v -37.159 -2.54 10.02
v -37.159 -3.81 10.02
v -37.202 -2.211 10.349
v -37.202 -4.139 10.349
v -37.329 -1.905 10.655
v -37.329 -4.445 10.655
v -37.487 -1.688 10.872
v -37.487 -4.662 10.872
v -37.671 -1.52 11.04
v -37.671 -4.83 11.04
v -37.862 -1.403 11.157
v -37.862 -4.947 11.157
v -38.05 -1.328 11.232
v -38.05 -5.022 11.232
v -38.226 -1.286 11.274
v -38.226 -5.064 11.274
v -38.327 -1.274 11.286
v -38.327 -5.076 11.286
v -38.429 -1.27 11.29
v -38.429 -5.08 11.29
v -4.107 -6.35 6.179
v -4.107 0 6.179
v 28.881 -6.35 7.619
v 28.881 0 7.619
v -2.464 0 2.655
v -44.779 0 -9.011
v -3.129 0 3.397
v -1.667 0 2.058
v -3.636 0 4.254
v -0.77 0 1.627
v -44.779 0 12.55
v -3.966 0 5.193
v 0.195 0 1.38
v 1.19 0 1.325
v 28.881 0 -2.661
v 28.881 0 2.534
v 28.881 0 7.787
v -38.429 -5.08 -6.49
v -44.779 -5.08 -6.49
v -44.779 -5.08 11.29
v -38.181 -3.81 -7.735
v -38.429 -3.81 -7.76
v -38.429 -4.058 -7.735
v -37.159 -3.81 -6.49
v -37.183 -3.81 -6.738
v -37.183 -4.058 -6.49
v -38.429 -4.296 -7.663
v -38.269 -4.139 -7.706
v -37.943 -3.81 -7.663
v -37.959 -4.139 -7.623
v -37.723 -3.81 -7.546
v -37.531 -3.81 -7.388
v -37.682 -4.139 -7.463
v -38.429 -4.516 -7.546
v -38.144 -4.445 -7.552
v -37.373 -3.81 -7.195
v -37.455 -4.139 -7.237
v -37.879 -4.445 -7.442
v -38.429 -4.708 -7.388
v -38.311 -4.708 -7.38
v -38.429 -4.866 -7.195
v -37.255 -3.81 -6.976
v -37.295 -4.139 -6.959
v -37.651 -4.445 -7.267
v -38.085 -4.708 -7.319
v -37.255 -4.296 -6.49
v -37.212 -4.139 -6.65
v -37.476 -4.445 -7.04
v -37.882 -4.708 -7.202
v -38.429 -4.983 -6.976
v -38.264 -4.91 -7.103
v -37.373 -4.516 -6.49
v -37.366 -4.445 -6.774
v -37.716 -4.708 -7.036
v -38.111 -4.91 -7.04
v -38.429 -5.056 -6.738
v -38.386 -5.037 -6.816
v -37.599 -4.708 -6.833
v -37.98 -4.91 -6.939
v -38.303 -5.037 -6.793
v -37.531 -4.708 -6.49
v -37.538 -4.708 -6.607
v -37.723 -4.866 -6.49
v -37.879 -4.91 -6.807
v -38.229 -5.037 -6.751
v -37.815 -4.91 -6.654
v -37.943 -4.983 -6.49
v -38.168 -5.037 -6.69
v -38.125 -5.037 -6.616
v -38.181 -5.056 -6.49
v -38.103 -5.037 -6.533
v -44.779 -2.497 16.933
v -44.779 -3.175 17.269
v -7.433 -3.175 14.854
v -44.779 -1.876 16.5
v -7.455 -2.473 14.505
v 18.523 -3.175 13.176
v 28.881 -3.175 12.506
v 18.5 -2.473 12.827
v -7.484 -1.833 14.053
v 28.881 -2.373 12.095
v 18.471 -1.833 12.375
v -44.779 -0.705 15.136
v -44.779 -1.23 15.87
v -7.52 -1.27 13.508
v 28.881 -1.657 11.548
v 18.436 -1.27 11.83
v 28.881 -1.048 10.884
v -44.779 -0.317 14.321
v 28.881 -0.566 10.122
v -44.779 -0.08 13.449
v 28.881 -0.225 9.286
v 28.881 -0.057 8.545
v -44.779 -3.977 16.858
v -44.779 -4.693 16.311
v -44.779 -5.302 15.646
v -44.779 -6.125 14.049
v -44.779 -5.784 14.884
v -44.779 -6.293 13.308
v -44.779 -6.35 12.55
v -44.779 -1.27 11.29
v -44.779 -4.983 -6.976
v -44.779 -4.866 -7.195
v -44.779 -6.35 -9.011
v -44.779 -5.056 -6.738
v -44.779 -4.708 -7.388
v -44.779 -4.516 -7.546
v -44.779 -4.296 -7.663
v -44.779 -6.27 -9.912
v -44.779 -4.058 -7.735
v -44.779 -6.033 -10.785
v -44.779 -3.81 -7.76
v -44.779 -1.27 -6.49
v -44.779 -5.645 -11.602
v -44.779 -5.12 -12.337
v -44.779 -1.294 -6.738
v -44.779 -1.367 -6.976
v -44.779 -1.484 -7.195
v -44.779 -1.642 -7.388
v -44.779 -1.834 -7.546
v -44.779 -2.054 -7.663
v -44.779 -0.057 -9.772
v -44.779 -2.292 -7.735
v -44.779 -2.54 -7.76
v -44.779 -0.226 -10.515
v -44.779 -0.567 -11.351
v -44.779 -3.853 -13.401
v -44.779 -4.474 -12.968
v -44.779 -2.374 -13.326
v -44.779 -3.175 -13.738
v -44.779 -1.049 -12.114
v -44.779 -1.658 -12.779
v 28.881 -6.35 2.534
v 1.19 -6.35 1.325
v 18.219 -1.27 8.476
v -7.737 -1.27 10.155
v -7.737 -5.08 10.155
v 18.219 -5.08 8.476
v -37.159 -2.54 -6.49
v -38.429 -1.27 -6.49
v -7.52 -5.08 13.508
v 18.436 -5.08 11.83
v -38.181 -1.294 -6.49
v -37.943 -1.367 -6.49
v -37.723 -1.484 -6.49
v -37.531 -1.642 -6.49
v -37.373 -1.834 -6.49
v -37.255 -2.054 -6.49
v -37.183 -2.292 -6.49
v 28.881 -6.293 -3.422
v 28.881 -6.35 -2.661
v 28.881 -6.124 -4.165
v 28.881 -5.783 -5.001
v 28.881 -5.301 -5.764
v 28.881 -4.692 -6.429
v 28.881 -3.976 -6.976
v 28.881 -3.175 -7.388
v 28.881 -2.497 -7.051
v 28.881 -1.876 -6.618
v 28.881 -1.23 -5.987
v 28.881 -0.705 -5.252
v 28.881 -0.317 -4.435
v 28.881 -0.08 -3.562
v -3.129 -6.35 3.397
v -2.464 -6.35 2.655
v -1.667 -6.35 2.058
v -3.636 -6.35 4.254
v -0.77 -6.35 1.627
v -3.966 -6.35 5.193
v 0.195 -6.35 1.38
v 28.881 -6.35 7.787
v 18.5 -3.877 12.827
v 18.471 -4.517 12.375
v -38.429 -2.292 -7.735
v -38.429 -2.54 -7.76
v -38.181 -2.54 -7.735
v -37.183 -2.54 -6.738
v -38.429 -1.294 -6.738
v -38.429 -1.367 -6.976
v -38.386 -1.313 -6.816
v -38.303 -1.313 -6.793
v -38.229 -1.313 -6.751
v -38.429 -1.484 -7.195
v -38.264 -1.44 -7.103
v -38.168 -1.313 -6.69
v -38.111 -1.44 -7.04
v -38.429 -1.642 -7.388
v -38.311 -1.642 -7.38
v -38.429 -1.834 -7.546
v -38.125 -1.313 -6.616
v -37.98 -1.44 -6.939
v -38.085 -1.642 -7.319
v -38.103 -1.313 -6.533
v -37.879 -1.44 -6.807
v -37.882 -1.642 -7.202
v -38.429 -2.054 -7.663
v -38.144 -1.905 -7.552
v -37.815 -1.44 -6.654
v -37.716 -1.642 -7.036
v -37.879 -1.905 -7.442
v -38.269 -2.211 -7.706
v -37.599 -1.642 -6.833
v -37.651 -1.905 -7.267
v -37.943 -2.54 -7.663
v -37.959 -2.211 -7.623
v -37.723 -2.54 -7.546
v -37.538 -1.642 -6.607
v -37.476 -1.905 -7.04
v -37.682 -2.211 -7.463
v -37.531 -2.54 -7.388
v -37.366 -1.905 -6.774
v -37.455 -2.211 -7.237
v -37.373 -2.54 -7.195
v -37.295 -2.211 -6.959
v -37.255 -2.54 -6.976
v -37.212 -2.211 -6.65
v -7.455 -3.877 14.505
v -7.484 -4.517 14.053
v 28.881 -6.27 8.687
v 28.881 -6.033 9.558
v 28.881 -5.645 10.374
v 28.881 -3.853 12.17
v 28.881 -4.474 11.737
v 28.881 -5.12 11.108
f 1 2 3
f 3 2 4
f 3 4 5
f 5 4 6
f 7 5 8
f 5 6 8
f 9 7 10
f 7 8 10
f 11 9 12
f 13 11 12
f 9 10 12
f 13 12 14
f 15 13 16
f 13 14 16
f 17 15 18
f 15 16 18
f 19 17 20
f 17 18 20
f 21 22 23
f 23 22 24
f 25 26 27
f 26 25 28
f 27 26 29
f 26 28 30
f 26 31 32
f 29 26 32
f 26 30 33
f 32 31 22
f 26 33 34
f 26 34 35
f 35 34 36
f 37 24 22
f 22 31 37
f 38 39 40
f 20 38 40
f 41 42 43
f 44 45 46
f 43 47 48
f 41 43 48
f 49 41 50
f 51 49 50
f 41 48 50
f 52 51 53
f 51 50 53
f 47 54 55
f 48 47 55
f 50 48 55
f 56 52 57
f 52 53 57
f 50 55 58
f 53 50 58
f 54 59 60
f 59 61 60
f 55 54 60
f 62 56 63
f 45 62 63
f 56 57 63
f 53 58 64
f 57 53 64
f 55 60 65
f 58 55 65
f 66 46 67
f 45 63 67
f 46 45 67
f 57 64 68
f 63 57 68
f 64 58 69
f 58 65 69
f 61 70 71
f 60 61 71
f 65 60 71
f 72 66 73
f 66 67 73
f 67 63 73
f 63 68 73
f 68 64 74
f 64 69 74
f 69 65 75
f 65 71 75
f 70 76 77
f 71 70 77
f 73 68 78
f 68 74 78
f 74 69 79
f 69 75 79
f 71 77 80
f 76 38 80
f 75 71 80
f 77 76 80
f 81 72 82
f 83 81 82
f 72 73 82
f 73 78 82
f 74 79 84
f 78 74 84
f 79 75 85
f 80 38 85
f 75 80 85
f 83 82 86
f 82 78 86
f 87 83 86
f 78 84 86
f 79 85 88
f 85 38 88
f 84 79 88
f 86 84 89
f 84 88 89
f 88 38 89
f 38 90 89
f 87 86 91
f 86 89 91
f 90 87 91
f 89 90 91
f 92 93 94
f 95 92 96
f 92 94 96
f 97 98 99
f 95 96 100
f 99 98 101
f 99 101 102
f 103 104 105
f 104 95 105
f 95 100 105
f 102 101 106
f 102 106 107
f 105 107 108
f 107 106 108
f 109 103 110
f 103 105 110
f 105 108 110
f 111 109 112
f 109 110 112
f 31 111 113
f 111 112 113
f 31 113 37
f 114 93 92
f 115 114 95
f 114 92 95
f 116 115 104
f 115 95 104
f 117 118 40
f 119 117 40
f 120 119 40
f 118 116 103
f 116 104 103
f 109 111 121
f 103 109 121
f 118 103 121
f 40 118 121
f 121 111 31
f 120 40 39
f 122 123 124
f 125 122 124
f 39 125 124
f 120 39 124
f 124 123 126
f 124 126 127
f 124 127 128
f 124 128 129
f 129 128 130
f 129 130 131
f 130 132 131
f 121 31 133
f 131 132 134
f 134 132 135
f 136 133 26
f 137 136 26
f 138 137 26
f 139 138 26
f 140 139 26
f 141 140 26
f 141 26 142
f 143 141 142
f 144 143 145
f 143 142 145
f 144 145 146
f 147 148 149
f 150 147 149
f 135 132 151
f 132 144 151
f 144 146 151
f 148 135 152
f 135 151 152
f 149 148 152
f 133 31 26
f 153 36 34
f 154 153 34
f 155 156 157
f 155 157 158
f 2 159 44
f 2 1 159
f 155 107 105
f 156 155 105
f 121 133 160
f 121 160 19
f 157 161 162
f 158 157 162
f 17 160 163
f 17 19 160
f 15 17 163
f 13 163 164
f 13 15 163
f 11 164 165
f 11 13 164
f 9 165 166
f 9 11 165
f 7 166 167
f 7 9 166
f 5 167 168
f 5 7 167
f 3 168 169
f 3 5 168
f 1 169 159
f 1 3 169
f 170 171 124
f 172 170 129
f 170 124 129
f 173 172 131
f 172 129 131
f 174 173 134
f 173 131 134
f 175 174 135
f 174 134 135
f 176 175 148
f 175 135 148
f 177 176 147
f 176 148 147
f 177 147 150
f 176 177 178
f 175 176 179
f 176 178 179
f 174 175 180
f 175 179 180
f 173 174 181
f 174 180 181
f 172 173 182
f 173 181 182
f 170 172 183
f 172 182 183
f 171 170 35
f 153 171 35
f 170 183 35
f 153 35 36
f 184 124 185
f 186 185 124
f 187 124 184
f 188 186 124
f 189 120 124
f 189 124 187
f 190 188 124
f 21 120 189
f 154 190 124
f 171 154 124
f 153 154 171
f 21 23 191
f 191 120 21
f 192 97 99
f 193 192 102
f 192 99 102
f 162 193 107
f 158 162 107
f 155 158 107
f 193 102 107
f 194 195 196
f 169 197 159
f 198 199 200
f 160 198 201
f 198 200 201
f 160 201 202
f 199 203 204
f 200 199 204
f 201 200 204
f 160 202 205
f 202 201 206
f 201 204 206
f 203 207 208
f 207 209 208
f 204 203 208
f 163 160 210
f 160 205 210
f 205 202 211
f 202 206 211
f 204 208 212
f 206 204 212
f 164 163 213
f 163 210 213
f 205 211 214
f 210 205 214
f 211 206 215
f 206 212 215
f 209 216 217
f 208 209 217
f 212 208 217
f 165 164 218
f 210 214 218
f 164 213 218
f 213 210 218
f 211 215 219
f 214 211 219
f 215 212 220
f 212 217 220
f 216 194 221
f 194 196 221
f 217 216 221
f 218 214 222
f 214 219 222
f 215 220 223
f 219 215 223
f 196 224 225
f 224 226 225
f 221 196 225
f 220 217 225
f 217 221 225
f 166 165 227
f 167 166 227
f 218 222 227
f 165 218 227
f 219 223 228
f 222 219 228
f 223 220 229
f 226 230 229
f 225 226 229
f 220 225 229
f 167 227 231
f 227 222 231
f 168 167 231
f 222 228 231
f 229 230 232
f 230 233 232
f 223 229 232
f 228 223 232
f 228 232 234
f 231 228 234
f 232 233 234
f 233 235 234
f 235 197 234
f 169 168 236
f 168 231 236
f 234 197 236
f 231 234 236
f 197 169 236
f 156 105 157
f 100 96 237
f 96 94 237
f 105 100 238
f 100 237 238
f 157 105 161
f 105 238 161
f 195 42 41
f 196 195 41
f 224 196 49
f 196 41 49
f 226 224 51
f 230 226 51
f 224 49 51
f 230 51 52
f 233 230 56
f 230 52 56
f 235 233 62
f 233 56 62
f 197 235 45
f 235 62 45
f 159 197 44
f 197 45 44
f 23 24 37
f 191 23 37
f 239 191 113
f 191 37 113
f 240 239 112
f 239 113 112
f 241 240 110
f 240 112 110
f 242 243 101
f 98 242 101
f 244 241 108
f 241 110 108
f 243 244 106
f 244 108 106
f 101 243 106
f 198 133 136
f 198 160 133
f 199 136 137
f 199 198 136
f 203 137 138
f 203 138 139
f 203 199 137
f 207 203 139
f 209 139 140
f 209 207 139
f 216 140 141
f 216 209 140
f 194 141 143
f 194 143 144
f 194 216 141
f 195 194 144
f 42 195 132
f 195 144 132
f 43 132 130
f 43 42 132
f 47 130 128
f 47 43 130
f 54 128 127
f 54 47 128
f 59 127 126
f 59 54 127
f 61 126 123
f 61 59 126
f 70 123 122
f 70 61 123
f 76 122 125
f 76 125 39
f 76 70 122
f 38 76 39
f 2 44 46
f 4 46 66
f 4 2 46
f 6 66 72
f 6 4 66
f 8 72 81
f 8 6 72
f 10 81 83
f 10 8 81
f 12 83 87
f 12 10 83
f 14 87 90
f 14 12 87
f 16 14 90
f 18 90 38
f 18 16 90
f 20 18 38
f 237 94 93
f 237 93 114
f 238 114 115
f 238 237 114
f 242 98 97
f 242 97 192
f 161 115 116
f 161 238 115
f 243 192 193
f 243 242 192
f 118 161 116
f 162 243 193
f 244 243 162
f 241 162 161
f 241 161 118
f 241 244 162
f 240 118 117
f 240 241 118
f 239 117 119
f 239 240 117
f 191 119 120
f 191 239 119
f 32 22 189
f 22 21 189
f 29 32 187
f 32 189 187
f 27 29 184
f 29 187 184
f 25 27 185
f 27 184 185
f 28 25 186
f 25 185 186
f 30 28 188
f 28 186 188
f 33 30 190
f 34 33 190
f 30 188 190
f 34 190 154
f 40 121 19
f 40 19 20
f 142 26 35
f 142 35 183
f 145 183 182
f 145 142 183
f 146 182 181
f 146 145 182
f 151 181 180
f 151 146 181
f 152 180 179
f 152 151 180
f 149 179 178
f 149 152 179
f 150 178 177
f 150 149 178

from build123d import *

# Parameters (mm, degrees)
F1_DEPTH    = 6.35
F2_W        = 3.81
F2_H        = 19.05
F3_DEPTH    = 7.62
F4_R        = 1.27
F5_R        = 1.27
F7_DEPTH    = 5.08
F8_T1_DEPTH = 99.3332002554
F8_T3_DEPTH = 99.2137995652
F9_R        = 5.07999


# Not quite as in the source:
# - a fillet or chamfer that OpenCascade refuses, or shapes differently, is made with other operations: its cross-section is extruded or revolved along the edge and cut away or added
# - a fillet or chamfer is up to 0.001 mm smaller than in the source, because OpenCascade refuses the exact size


with BuildPart() as f1:
    # F0 (on Front) → F1 (new body)
    with BuildSketch(Plane.XZ):
        Polygon((28.8813739334, 7.6191808492), (28.8813739334, 12.8777329371), (-44.7786260666, 17.6402329371), (-44.7786260666, -14.1097670629), (28.8813739334, -7.7597670629), (28.8813739334, 2.5343412086), (-3.8856118554, 1.1037037128), (-4.1071983432, 6.1788686784), align=None)
    extrude(amount=F1_DEPTH)

    # F2 (on face) → F3 (cut)
    with BuildSketch(Plane(origin=(-44.7786260666, 0, 0), x_dir=(0, -1, 0), z_dir=(-1, 0, 0))):
        with Locations((3.175, 1.7652329371)):
            Rectangle(F2_W, F2_H)
    extrude(amount=-F3_DEPTH, mode=Mode.SUBTRACT)

    # F4
    f4_edges = [f1.edges().sort_by_distance(p)[0] for p in [
        (-37.158626, -3.175, -7.759767),
    ]]
    fillet(f4_edges, radius=F4_R)

    # F5
    f5_edges = [f1.edges().sort_by_distance(p)[0] for p in [
        (-37.158626, -3.175, 11.290233),
        (-37.158626, -5.08, 2.400233),
        (-37.158626, -1.27, 2.400233),
    ]]
    fillet(f5_edges, radius=F5_R)

    # F6 (on face) → F7 (cut)
    with BuildSketch(Plane(origin=(0.9493759321, 0, 14.6836810837), x_dir=(0.9979163847, 0, -0.0645204559), z_dir=(0.0645204559, 0, 0.9979163847))):
        Polygon((15.2903190595, -1.27), (2.5903190595, -1.27), (-8.3756055683, -1.27), (-8.3756055683, -5.08), (15.2903190595, -5.08), (17.6343005151, -5.08), (17.6343005151, -1.27), align=None)
    extrude(amount=-F7_DEPTH, mode=Mode.SUBTRACT)

    # F8: fillet of radius 5.08 on 4 edges, made by hand

    # F8_s2 → F8_t1 (cut)
    with BuildSketch(Plane(origin=(-58.308759718, 0, -5.0266172171), x_dir=(0, 1, 0), z_dir=(0.996304769, 0, 0.0858883422))):
        with BuildLine():
            ThreePointArc((-6.35, -5.1316662572), (-4.8621024484, -8.7237687056), (-1.27, -10.2116662572))
            Line((-1.27, -10.2116662572), (-6.35, -10.2116662572))
            Line((-6.35, -10.2116662572), (-6.35, -5.1316662572))
        make_face()
        with BuildLine():
            ThreePointArc((0, -5.1316662572), (-1.4878975516, -8.7237687056), (-5.08, -10.2116662572))
            Line((-5.08, -10.2116662572), (0, -10.2116662572))
            Line((0, -10.2116662572), (0, -5.1316662572))
        make_face()
    extrude(amount=F8_T1_DEPTH, mode=Mode.SUBTRACT)

    # F8_s4 → F8_t3 (cut)
    with BuildSketch(Plane(origin=(40.6055360865, 0, -2.6253579366), x_dir=(0, 1, 0), z_dir=(-0.9979163847, 0, 0.0645204559))):
        with BuildLine():
            ThreePointArc((-1.27, -14.7143401085), (-4.8621024484, -13.2264425569), (-6.35, -9.6343401085))
            Line((-6.35, -9.6343401085), (-6.35, -14.7143401085))
            Line((-6.35, -14.7143401085), (-1.27, -14.7143401085))
        make_face()
        with BuildLine():
            ThreePointArc((-5.08, -14.7143401085), (-1.4878975516, -13.2264425569), (0, -9.6343401085))
            Line((0, -9.6343401085), (0, -14.7143401085))
            Line((0, -14.7143401085), (-5.08, -14.7143401085))
        make_face()
    extrude(amount=F8_T3_DEPTH, mode=Mode.SUBTRACT)

    # F9 (radius 5.08 in the source; OpenCascade refuses exactly that, so slightly less here)
    f9_edges = [f1.edges().sort_by_distance(p)[0] for p in [
        (-3.885612, -3.175, 1.103704),
    ]]
    fillet(f9_edges, radius=F9_R)


solid = f1.part
